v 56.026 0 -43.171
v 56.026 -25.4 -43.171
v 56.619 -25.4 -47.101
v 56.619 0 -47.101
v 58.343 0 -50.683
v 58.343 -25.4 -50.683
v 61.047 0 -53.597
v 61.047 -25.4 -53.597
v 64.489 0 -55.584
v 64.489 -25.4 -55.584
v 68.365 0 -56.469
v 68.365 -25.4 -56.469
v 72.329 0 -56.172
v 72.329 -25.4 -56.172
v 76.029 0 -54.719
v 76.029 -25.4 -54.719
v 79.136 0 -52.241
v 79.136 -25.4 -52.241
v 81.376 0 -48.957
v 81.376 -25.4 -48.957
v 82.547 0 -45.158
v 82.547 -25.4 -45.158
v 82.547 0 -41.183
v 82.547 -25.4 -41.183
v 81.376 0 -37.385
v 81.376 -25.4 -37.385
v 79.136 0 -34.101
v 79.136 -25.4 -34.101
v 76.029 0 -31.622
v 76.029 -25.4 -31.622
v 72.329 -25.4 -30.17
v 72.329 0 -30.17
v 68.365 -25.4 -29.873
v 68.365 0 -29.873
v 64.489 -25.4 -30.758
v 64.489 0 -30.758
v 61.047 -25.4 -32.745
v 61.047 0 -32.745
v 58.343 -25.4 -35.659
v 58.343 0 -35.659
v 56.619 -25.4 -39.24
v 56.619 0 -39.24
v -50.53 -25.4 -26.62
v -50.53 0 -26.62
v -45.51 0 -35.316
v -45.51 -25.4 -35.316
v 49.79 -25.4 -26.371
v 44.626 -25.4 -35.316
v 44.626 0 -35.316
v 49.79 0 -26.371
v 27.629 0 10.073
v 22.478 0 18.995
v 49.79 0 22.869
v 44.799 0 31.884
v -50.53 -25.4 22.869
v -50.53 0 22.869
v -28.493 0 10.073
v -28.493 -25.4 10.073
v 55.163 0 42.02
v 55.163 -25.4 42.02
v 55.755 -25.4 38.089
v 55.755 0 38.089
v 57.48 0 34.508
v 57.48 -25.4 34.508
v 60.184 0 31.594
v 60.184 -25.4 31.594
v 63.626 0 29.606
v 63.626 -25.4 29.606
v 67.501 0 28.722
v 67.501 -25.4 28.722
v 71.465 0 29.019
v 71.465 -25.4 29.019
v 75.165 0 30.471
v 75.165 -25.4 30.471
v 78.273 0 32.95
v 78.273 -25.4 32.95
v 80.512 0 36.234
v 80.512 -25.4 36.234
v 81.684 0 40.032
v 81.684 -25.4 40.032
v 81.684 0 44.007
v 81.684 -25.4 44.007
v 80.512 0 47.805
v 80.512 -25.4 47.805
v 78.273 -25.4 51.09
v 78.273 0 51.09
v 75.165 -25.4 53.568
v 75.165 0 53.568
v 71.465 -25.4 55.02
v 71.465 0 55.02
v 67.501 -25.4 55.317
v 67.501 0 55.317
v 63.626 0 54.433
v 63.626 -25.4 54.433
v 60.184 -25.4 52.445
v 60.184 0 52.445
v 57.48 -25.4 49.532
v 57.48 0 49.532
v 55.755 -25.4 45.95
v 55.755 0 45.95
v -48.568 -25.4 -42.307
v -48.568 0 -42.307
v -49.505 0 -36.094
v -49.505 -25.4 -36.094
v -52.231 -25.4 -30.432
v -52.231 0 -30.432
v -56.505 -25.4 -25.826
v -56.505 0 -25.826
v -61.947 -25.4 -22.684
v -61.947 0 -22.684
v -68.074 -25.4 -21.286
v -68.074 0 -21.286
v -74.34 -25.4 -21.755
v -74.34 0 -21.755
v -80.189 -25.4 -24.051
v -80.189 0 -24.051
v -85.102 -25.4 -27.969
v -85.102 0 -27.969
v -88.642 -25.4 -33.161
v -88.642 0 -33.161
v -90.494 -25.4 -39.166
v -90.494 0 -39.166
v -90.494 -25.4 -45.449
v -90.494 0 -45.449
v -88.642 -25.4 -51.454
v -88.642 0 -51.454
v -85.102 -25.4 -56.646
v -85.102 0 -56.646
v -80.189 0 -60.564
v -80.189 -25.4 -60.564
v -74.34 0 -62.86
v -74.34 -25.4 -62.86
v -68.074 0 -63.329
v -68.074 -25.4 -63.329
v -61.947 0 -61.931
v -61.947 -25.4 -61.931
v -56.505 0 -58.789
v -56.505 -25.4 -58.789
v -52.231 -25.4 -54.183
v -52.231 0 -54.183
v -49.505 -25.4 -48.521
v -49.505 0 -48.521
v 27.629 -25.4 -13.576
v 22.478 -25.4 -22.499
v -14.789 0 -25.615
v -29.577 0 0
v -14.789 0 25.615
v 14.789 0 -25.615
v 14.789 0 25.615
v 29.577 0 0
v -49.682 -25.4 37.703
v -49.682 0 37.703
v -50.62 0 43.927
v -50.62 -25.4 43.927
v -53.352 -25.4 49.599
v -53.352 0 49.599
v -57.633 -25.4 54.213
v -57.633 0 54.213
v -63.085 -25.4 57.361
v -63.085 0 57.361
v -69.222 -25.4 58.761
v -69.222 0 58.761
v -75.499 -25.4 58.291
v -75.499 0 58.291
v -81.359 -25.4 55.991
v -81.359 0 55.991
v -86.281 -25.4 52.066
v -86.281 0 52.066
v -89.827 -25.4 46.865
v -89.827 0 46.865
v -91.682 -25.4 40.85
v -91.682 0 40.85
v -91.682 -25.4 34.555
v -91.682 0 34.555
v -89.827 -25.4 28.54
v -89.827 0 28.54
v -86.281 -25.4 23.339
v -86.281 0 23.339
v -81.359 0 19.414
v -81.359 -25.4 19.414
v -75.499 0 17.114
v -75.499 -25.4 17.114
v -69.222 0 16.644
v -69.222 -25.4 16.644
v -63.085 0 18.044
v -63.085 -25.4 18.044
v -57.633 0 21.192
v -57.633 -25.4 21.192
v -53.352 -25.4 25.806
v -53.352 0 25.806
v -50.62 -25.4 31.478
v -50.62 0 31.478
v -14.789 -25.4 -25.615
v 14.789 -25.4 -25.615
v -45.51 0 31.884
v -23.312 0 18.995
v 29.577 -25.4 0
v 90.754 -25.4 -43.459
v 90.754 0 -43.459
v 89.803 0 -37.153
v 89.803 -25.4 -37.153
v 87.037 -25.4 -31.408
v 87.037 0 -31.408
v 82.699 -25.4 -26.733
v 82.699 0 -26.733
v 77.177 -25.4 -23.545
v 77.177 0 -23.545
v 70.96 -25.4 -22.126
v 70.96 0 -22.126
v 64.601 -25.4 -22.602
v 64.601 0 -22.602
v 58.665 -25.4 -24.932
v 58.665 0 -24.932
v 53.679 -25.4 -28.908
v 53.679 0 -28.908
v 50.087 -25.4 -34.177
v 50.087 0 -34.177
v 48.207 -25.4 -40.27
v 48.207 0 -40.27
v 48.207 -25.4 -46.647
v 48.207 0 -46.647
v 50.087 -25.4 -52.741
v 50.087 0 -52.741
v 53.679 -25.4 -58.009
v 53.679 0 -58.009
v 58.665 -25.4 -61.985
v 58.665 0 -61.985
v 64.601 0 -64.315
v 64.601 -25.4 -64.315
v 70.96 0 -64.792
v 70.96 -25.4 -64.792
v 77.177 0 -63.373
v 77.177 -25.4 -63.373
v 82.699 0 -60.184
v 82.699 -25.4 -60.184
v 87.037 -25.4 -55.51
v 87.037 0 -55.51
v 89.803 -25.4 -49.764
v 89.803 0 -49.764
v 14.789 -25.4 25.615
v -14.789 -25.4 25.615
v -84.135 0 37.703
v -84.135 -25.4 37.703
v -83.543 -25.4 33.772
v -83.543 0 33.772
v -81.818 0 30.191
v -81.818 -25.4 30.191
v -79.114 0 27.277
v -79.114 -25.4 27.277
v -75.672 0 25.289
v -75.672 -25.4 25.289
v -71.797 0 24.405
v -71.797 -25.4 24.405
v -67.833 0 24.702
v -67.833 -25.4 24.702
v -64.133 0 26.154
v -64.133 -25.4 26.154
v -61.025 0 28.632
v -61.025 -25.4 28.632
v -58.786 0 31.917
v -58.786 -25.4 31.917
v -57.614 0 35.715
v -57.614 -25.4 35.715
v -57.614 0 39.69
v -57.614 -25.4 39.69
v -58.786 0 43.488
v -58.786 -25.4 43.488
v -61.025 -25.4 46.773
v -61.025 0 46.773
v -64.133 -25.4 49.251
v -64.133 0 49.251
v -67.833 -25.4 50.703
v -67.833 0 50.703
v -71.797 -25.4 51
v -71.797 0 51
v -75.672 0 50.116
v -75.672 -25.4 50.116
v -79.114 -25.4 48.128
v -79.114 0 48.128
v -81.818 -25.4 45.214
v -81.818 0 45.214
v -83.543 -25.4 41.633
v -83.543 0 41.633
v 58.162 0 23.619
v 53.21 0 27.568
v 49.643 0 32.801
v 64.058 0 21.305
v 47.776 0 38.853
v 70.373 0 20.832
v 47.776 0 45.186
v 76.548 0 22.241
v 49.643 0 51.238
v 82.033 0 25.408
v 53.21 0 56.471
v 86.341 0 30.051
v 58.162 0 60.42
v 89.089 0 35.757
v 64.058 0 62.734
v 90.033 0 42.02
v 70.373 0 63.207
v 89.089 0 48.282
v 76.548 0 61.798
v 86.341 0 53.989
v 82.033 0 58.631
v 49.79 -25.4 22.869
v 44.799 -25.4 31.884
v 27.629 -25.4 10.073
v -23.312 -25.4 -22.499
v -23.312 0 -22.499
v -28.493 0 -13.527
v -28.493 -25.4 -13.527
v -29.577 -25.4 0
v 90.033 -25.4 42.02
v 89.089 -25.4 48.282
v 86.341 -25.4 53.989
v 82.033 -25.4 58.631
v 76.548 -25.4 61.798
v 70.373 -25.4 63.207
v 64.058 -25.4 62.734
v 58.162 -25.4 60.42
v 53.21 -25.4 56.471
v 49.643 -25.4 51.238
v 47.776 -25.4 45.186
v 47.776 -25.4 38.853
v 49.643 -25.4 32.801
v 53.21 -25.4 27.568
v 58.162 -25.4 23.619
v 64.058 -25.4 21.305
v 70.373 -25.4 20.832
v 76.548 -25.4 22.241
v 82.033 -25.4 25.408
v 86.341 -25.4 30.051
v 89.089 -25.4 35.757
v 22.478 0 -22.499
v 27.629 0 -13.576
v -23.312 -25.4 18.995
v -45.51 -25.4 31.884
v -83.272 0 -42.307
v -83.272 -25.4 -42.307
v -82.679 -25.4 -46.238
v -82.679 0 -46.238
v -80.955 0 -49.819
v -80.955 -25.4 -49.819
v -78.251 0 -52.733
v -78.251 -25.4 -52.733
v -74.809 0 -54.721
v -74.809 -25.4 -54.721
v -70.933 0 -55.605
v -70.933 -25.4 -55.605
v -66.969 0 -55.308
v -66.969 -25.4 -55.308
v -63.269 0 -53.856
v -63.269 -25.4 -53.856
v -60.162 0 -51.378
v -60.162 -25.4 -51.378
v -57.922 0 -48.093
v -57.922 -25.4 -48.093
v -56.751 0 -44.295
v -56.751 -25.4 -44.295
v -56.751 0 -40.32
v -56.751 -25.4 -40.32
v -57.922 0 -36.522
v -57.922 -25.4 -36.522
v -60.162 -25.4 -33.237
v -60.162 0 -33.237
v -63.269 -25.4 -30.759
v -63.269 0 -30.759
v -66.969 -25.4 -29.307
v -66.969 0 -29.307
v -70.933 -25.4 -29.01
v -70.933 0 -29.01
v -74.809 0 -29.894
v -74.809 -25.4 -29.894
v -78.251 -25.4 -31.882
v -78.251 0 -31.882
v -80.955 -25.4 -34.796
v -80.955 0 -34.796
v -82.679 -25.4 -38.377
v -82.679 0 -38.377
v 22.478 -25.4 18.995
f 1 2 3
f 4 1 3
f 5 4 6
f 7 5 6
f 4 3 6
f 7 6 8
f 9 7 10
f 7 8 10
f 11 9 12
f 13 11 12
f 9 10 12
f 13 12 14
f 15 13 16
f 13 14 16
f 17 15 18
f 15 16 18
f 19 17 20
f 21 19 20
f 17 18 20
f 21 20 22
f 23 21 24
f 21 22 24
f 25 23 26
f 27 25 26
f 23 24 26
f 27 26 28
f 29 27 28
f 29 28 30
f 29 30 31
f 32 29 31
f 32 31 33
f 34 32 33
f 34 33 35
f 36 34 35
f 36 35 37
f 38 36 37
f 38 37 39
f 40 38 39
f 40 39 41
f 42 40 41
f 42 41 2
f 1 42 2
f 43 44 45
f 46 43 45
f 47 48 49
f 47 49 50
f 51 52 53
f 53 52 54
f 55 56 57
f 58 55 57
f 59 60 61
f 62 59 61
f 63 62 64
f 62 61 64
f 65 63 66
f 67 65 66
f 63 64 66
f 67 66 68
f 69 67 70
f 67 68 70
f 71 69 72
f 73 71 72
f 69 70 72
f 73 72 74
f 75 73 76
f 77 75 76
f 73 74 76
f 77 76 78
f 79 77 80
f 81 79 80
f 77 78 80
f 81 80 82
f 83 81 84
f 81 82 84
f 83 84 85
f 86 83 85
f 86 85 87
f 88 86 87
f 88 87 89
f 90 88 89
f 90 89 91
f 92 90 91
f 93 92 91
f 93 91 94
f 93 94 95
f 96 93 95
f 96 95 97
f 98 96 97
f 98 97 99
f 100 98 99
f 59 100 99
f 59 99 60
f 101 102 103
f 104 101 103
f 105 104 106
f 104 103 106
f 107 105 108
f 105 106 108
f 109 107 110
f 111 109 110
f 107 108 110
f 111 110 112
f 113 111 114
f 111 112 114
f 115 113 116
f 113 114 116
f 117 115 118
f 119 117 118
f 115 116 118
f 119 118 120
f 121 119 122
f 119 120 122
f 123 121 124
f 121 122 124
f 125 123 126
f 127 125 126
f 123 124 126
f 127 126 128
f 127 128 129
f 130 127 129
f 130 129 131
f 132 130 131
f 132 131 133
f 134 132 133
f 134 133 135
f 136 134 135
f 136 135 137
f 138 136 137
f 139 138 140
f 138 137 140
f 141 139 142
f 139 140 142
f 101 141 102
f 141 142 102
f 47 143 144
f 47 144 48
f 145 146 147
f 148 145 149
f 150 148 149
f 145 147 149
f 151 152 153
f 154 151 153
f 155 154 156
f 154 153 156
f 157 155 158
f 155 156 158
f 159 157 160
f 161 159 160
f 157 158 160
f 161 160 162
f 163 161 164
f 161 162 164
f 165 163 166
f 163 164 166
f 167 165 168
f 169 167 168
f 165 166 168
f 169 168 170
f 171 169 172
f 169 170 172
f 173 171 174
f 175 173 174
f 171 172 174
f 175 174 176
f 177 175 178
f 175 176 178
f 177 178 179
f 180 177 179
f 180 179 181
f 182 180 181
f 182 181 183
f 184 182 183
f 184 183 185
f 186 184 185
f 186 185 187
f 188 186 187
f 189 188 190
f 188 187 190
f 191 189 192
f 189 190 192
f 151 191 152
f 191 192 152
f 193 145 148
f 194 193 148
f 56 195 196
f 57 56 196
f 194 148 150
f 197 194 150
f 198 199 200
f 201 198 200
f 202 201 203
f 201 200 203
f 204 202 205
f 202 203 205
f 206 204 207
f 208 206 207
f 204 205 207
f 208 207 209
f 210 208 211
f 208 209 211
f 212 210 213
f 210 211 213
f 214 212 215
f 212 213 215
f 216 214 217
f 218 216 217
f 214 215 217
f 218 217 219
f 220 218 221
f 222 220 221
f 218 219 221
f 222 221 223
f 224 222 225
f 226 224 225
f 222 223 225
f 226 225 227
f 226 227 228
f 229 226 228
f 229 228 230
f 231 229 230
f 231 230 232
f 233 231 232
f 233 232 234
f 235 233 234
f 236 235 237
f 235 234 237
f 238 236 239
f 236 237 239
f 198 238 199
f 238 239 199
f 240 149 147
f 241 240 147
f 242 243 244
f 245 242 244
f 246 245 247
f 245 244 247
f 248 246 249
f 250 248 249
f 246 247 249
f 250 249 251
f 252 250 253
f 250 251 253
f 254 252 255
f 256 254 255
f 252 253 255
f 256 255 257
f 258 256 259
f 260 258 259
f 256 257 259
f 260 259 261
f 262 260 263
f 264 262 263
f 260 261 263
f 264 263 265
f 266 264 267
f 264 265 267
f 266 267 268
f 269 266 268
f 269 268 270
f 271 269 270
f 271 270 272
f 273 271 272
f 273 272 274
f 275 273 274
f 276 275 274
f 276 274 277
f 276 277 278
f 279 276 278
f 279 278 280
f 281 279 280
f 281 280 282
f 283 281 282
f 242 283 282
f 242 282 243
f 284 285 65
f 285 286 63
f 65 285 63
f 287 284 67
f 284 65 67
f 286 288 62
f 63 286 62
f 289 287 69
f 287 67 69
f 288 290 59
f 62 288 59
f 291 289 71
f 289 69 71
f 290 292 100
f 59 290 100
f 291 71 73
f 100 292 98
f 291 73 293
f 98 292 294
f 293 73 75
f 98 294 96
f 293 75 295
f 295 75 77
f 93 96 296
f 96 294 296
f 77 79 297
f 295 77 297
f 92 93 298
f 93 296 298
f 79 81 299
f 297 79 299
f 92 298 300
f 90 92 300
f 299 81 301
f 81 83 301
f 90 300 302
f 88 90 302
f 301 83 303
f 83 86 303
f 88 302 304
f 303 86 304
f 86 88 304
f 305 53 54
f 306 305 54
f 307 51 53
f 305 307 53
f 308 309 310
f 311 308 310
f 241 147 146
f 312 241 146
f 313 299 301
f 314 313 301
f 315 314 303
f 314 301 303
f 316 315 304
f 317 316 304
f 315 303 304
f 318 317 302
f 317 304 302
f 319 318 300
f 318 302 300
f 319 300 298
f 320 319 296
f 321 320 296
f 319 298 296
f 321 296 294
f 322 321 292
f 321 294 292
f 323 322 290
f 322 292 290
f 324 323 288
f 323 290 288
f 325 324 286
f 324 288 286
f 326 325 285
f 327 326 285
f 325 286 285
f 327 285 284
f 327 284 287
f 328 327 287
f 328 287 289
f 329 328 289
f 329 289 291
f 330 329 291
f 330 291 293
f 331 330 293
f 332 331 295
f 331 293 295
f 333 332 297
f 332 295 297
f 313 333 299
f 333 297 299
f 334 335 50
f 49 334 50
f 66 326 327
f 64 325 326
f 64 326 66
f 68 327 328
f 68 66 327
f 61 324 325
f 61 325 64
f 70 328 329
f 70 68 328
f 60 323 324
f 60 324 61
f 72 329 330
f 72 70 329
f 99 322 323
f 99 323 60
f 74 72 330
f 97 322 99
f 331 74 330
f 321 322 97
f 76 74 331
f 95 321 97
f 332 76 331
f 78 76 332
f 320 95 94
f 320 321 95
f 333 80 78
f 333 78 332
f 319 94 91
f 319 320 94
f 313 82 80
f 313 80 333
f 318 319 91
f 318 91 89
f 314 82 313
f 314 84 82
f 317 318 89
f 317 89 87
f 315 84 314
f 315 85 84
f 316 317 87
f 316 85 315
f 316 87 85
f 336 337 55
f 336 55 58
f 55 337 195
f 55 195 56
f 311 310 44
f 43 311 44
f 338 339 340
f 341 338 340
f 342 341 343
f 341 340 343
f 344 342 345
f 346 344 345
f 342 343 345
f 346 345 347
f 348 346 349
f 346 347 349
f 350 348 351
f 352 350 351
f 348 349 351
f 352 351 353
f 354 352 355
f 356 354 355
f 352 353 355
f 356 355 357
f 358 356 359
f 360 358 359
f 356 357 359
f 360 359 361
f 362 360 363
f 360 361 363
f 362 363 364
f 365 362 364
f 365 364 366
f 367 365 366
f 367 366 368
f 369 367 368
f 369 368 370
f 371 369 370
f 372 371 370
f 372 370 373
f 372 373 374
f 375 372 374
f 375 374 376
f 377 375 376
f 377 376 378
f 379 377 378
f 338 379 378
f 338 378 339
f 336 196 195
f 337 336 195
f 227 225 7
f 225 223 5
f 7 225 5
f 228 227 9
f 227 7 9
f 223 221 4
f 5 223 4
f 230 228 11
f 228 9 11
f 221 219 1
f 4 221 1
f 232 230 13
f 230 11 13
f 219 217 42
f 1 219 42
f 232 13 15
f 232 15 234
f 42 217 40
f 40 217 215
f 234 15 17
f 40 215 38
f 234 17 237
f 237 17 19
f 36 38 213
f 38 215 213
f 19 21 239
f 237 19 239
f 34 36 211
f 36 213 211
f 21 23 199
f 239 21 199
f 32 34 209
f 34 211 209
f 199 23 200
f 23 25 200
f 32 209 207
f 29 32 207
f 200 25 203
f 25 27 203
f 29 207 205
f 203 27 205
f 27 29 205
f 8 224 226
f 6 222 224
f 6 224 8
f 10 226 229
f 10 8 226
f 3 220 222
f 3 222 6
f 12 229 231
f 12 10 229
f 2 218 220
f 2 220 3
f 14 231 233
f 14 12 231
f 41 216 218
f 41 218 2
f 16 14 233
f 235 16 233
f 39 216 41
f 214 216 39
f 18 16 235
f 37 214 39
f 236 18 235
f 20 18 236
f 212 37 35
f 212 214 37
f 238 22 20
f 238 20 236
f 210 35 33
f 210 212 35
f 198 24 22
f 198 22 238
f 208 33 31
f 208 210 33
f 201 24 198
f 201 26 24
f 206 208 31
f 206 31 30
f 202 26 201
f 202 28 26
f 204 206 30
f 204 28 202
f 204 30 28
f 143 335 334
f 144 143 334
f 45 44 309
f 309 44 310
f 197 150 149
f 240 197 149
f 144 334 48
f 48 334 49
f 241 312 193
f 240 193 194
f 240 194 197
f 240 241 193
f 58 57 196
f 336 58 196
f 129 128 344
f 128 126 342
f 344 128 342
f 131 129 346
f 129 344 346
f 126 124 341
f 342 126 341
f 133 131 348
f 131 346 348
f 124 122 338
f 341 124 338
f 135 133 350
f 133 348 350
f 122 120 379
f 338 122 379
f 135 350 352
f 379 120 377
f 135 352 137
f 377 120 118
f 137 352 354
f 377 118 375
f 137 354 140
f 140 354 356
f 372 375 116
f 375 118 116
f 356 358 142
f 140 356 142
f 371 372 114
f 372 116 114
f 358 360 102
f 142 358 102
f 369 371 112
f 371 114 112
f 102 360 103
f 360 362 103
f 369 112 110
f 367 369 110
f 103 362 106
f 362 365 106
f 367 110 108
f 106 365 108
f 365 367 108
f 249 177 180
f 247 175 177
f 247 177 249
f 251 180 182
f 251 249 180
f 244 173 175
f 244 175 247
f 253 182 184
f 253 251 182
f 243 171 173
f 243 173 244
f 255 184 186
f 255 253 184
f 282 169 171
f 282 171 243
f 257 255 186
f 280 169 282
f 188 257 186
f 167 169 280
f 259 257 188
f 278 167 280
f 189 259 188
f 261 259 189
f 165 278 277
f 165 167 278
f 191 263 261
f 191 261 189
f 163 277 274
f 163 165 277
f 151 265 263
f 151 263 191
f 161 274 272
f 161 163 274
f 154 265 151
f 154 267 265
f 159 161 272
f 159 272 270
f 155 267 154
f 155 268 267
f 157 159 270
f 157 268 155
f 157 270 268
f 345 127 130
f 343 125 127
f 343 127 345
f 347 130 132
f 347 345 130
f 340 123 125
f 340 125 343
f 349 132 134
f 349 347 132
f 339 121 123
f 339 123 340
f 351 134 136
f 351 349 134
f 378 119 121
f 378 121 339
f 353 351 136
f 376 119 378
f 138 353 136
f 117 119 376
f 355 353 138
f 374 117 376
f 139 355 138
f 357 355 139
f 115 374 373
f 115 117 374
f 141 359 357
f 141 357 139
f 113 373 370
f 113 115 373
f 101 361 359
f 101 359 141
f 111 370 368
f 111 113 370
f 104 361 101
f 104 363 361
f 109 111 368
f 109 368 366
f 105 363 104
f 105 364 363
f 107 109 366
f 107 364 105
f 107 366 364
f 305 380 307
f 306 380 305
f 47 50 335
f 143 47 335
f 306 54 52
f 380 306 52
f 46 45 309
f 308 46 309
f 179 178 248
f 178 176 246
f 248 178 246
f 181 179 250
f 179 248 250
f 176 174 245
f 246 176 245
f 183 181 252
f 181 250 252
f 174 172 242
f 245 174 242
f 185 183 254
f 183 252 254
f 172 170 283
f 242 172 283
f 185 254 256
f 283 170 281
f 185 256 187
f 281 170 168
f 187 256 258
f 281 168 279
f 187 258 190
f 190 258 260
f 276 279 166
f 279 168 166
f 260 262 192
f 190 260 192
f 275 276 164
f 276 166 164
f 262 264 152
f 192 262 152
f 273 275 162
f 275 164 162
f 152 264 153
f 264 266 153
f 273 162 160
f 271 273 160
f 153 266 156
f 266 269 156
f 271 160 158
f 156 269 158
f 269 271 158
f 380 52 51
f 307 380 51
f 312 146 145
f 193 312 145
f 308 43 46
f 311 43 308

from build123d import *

# Parameters (mm, degrees)
F2_DEPTH = 25.4
F0_R     = 21.2470065786
F0_R_2   = 21.0806617066
F0_R_3   = 21.1179606742
F0_R_4   = 21.3927044232
F3_D     = 26.67
F3_2_D   = 26.67
F3_3_D   = 26.67
F3_4_D   = 26.67


with BuildPart() as f2:
    # F0 (on Front) → F2 (new body)
    with BuildSketch(Plane.XZ):
        Polygon((-28.4927692264, 10.0732017308), (-23.312266916, 18.9951807261), (-45.5095960839, 31.8839484647), (-50.5304058193, 22.8692447776), align=None)
    extrude(amount=F2_DEPTH)


with BuildPart() as f2b:
    # F0 (on Front) → F2, piece 2 (new body)
    with BuildSketch(Plane.XZ):
        Polygon((-14.788661092, -25.6147123873), (14.788661092, -25.6147123873), (29.5773221841, 0), (14.788661092, 25.6147123873), (-14.788661092, 25.6147123873), (-29.5773221841, 0), align=None)
    extrude(amount=F2_DEPTH)


with BuildPart() as f2c:
    # F0 (on Front) → F2, piece 3 (new body)
    with BuildSketch(Plane.XZ):
        Polygon((22.4776970185, 18.9951807261), (27.6293512434, 10.0732017308), (49.7903935611, 22.8692447776), (44.7993261531, 31.8839484647), align=None)
    extrude(amount=F2_DEPTH)


with BuildPart() as f2d:
    # F0 (on Front) → F2, piece 4 (new body)
    with BuildSketch(Plane.XZ):
        with Locations((68.7855780125, 42.0196428895)):
            Circle(F0_R)
    extrude(amount=F2_DEPTH)

    # F3 (through all)
    with Locations(Plane(origin=(0, 0, 0), x_dir=(1, 0, 0), z_dir=(0, 1, 0))):
        with Locations((-70.8002150059, -37.7025529742), (-69.9367970228, 42.3074476421), (68.4977695346, -42.0196428895), (69.3611875176, 43.1708656251)):
            Hole(F3_D / 2)


with BuildPart() as f2e:
    # F0 (on Front) → F2, piece 5 (new body)
    with BuildSketch(Plane.XZ):
        with Locations((-69.6489959955, -42.3074476421)):
            Circle(F0_R_2)
    extrude(amount=F2_DEPTH)

    # F3#2 (through all)
    with Locations(Plane(origin=(0, 0, 0), x_dir=(1, 0, 0), z_dir=(0, 1, 0))):
        with Locations((-70.8002150059, -37.7025529742), (-69.9367970228, 42.3074476421), (68.4977695346, -42.0196428895), (69.3611875176, 43.1708656251)):
            Hole(F3_2_D / 2)


with BuildPart() as f2f:
    # F0 (on Front) → F2, piece 6 (new body)
    with BuildSketch(Plane.XZ):
        with Locations((-70.8002150059, 37.7025529742)):
            Circle(F0_R_3)
    extrude(amount=F2_DEPTH)

    # F3#3 (through all)
    with Locations(Plane(origin=(0, 0, 0), x_dir=(1, 0, 0), z_dir=(0, 1, 0))):
        with Locations((-70.8002150059, -37.7025529742), (-69.9367970228, 42.3074476421), (68.4977695346, -42.0196428895), (69.3611875176, 43.1708656251)):
            Hole(F3_3_D / 2)


with BuildPart() as f2g:
    # F0 (on Front) → F2, piece 7 (new body)
    with BuildSketch(Plane.XZ):
        Polygon((-23.312266916, -22.4988109062), (-28.4927692264, -13.5268708691), (-50.5304058193, -26.6204326355), (-45.5095960839, -35.3158064014), align=None)
    extrude(amount=F2_DEPTH)


with BuildPart() as f2h:
    # F0 (on Front) → F2, piece 8 (new body)
    with BuildSketch(Plane.XZ):
        Polygon((27.6293512434, -13.5758840456), (22.4776970185, -22.4988109062), (44.6258576428, -35.3158064014), (49.7903935611, -26.3705677933), align=None)
    extrude(amount=F2_DEPTH)


with BuildPart() as f2i:
    # F0 (on Front) → F2, piece 9 (new body)
    with BuildSketch(Plane.XZ):
        with Locations((69.3611875176, -43.4586666524)):
            Circle(F0_R_4)
    extrude(amount=F2_DEPTH)

    # F3#4 (through all)
    with Locations(Plane(origin=(0, 0, 0), x_dir=(1, 0, 0), z_dir=(0, 1, 0))):
        with Locations((-70.8002150059, -37.7025529742), (-69.9367970228, 42.3074476421), (68.4977695346, -42.0196428895), (69.3611875176, 43.1708656251)):
            Hole(F3_4_D / 2)


solid = Compound([f2.part, f2b.part, f2c.part, f2d.part, f2e.part, f2f.part, f2g.part, f2h.part, f2i.part])
